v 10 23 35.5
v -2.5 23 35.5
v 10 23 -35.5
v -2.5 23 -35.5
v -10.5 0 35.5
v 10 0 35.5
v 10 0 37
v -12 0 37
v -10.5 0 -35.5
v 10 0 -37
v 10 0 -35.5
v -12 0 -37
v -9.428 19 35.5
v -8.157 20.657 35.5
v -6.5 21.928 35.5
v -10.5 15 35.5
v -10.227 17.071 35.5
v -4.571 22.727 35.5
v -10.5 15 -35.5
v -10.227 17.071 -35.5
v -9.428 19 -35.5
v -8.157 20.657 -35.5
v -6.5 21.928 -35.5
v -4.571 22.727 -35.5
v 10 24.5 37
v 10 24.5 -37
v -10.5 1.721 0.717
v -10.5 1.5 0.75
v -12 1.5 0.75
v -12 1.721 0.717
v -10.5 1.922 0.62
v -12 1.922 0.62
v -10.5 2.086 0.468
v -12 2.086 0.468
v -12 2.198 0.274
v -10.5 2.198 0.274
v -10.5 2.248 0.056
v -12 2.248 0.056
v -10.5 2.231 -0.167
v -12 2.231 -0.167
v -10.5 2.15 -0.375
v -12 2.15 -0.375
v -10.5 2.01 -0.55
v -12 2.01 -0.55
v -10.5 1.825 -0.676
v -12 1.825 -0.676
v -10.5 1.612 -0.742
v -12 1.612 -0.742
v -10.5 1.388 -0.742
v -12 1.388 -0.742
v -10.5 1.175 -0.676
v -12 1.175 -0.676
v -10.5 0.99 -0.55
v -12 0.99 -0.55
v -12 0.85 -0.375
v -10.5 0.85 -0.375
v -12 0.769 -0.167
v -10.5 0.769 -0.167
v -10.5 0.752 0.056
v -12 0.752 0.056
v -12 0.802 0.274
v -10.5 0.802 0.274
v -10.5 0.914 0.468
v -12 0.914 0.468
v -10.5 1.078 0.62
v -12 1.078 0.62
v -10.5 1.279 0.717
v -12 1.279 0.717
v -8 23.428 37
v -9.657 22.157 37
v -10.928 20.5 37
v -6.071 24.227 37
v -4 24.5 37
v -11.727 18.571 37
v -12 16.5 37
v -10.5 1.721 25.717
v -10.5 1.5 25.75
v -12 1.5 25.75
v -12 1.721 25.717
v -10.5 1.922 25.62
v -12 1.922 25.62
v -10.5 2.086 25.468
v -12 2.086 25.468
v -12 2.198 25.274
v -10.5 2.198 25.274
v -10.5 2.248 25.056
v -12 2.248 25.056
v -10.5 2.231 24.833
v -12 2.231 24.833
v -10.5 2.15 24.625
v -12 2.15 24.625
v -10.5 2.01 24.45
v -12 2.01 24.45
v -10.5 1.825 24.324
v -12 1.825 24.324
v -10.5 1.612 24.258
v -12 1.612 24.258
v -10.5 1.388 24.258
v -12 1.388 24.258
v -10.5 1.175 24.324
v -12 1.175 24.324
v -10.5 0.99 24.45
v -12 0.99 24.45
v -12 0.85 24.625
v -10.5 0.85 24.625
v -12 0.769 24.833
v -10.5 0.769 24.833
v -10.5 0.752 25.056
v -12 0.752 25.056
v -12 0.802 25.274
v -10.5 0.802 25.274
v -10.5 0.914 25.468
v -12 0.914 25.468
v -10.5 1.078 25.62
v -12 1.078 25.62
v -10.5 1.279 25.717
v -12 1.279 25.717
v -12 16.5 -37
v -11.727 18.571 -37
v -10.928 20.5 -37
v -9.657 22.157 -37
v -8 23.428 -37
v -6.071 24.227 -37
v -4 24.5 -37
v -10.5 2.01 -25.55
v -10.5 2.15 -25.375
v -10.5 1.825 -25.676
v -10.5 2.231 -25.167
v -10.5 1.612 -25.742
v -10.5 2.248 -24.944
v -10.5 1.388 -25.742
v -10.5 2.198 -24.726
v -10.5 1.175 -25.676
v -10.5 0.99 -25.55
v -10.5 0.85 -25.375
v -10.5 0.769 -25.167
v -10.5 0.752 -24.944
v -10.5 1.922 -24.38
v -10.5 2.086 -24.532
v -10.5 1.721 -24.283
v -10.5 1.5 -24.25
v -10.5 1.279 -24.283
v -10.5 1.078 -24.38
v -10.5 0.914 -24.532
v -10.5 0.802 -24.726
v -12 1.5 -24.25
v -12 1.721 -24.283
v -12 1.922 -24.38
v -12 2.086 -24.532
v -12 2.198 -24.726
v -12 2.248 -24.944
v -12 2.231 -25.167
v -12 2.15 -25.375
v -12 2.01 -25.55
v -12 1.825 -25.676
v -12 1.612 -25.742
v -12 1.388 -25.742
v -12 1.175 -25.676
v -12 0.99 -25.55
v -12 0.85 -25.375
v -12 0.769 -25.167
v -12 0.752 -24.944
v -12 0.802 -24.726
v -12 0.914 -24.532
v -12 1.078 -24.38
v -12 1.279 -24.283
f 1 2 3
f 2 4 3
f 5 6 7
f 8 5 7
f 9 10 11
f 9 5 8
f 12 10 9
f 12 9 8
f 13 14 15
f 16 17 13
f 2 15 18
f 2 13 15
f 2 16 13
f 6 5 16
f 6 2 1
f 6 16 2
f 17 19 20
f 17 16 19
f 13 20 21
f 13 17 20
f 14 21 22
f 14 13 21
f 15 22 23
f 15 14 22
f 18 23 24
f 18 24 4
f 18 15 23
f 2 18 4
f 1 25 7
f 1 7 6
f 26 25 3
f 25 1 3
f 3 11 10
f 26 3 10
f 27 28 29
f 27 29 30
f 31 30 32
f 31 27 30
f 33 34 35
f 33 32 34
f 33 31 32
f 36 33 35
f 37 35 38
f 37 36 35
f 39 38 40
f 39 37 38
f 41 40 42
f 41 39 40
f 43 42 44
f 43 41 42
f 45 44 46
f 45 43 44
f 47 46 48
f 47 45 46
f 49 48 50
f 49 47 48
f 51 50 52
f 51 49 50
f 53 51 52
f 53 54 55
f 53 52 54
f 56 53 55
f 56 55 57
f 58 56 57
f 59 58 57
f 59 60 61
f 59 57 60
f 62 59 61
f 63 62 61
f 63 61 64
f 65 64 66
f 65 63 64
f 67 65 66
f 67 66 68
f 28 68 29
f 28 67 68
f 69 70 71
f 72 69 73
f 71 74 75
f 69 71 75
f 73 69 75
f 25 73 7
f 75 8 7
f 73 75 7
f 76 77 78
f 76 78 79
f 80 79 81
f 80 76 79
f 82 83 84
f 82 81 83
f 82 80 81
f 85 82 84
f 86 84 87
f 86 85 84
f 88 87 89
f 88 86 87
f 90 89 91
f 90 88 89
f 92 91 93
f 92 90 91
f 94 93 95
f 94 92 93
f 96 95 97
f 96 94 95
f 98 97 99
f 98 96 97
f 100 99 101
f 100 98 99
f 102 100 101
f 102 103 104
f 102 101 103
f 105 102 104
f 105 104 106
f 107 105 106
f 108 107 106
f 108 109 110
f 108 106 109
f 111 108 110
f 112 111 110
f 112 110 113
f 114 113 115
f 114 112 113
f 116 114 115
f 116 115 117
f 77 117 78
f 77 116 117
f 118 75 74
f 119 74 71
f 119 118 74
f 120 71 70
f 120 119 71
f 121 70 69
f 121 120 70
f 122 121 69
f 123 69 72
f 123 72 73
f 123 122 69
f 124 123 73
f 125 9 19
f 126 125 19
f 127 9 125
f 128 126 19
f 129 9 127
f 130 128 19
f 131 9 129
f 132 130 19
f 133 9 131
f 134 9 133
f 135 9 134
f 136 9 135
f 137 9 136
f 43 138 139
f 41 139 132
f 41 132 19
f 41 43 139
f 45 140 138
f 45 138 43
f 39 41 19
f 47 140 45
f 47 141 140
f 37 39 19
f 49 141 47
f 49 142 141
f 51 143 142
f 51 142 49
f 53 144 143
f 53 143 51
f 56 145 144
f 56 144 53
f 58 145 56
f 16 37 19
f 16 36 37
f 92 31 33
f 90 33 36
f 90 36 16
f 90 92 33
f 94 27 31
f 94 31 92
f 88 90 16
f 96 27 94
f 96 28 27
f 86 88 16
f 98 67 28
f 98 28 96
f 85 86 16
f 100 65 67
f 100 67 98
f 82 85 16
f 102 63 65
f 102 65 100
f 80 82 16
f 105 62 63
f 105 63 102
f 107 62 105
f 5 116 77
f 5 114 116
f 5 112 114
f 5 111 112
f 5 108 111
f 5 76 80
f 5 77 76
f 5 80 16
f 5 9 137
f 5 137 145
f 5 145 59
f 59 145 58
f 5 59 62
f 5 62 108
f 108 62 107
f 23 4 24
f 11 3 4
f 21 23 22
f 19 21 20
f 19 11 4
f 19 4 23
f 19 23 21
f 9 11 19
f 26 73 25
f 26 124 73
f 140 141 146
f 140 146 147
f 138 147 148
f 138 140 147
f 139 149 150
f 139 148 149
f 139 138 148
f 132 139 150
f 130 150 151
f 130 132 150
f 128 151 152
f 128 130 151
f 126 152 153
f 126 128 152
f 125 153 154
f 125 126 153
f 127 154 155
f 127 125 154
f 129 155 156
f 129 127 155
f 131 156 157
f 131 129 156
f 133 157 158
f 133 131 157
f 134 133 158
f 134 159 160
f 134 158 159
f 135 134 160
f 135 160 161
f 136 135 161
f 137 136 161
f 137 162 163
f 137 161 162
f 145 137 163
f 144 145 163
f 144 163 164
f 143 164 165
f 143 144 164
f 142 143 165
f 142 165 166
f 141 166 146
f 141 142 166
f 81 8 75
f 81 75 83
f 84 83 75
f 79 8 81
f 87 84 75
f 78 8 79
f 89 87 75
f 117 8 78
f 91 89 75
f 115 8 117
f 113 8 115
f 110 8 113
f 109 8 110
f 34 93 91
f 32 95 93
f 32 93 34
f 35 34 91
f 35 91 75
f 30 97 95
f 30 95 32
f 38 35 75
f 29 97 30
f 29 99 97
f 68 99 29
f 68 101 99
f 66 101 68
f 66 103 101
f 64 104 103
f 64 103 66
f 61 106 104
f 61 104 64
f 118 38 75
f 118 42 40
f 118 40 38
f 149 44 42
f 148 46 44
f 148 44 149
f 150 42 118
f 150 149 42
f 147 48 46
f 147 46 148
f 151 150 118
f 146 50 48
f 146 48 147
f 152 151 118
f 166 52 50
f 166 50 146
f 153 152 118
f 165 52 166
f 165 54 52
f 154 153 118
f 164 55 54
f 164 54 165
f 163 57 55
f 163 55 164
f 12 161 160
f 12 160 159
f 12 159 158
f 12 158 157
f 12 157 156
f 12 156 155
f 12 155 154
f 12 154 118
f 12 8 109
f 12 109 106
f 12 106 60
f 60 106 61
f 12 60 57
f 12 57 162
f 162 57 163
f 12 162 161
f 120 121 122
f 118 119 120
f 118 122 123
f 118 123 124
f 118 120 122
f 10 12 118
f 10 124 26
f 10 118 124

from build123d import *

# Parameters (mm, degrees)
BOSS_EXTRUDE1_DEPTH     = 23
SKETCH3_W               = 22
SKETCH3_H               = 74
BOSS_EXTRUDE2_DEPTH     = 1.5
FILLET1_R               = 8
CUT_EXTRUDE1_DEPTH      = 50.53029376
CUT_EXTRUDE1_DEPTH_BACK = 50.53029376
SKETCH4_R               = 0.75


with BuildPart() as part:
    # Sketch2 → Boss-Extrude1 (new body)
    with BuildSketch(Plane(origin=(0, 0, 0), x_dir=(1, 0, 0), z_dir=(0, 1, 0))):
        Polygon((-10.5, -35.5), (10, -35.5), (10, -37), (-12, -37), (-12, 37), (10, 37), (10, 35.5), (-10.5, 35.5), align=None)
    extrude(amount=BOSS_EXTRUDE1_DEPTH)

    # Sketch3 → Boss-Extrude2 (add)
    with BuildSketch(Plane(origin=(0, 23, 0), x_dir=(1, 0, 0), z_dir=(0, 1, 0))):
        with Locations((-1, 0)):
            Rectangle(SKETCH3_W, SKETCH3_H)
    extrude(amount=BOSS_EXTRUDE2_DEPTH)

    # Fillet1
    fillet1_edges = [part.edges().sort_by_distance(p)[0] for p in [
        (-12, 24.5, 0),
        (-10.5, 23, 0),
    ]]
    fillet(fillet1_edges, radius=FILLET1_R)

    # Sketch4 → Cut-Extrude1 (cut, two sides: drawn at the far end of the back side and taken through both)
    with BuildSketch(Plane.ZY.offset(12).offset(-CUT_EXTRUDE1_DEPTH_BACK)):
        with Locations((-25, 1.5)):
            Circle(SKETCH4_R)
        with Locations((0, 1.5)):
            Circle(SKETCH4_R)
        with Locations((25, 1.5)):
            Circle(SKETCH4_R)
    extrude(amount=CUT_EXTRUDE1_DEPTH + CUT_EXTRUDE1_DEPTH_BACK, mode=Mode.SUBTRACT)


solid = part.part
